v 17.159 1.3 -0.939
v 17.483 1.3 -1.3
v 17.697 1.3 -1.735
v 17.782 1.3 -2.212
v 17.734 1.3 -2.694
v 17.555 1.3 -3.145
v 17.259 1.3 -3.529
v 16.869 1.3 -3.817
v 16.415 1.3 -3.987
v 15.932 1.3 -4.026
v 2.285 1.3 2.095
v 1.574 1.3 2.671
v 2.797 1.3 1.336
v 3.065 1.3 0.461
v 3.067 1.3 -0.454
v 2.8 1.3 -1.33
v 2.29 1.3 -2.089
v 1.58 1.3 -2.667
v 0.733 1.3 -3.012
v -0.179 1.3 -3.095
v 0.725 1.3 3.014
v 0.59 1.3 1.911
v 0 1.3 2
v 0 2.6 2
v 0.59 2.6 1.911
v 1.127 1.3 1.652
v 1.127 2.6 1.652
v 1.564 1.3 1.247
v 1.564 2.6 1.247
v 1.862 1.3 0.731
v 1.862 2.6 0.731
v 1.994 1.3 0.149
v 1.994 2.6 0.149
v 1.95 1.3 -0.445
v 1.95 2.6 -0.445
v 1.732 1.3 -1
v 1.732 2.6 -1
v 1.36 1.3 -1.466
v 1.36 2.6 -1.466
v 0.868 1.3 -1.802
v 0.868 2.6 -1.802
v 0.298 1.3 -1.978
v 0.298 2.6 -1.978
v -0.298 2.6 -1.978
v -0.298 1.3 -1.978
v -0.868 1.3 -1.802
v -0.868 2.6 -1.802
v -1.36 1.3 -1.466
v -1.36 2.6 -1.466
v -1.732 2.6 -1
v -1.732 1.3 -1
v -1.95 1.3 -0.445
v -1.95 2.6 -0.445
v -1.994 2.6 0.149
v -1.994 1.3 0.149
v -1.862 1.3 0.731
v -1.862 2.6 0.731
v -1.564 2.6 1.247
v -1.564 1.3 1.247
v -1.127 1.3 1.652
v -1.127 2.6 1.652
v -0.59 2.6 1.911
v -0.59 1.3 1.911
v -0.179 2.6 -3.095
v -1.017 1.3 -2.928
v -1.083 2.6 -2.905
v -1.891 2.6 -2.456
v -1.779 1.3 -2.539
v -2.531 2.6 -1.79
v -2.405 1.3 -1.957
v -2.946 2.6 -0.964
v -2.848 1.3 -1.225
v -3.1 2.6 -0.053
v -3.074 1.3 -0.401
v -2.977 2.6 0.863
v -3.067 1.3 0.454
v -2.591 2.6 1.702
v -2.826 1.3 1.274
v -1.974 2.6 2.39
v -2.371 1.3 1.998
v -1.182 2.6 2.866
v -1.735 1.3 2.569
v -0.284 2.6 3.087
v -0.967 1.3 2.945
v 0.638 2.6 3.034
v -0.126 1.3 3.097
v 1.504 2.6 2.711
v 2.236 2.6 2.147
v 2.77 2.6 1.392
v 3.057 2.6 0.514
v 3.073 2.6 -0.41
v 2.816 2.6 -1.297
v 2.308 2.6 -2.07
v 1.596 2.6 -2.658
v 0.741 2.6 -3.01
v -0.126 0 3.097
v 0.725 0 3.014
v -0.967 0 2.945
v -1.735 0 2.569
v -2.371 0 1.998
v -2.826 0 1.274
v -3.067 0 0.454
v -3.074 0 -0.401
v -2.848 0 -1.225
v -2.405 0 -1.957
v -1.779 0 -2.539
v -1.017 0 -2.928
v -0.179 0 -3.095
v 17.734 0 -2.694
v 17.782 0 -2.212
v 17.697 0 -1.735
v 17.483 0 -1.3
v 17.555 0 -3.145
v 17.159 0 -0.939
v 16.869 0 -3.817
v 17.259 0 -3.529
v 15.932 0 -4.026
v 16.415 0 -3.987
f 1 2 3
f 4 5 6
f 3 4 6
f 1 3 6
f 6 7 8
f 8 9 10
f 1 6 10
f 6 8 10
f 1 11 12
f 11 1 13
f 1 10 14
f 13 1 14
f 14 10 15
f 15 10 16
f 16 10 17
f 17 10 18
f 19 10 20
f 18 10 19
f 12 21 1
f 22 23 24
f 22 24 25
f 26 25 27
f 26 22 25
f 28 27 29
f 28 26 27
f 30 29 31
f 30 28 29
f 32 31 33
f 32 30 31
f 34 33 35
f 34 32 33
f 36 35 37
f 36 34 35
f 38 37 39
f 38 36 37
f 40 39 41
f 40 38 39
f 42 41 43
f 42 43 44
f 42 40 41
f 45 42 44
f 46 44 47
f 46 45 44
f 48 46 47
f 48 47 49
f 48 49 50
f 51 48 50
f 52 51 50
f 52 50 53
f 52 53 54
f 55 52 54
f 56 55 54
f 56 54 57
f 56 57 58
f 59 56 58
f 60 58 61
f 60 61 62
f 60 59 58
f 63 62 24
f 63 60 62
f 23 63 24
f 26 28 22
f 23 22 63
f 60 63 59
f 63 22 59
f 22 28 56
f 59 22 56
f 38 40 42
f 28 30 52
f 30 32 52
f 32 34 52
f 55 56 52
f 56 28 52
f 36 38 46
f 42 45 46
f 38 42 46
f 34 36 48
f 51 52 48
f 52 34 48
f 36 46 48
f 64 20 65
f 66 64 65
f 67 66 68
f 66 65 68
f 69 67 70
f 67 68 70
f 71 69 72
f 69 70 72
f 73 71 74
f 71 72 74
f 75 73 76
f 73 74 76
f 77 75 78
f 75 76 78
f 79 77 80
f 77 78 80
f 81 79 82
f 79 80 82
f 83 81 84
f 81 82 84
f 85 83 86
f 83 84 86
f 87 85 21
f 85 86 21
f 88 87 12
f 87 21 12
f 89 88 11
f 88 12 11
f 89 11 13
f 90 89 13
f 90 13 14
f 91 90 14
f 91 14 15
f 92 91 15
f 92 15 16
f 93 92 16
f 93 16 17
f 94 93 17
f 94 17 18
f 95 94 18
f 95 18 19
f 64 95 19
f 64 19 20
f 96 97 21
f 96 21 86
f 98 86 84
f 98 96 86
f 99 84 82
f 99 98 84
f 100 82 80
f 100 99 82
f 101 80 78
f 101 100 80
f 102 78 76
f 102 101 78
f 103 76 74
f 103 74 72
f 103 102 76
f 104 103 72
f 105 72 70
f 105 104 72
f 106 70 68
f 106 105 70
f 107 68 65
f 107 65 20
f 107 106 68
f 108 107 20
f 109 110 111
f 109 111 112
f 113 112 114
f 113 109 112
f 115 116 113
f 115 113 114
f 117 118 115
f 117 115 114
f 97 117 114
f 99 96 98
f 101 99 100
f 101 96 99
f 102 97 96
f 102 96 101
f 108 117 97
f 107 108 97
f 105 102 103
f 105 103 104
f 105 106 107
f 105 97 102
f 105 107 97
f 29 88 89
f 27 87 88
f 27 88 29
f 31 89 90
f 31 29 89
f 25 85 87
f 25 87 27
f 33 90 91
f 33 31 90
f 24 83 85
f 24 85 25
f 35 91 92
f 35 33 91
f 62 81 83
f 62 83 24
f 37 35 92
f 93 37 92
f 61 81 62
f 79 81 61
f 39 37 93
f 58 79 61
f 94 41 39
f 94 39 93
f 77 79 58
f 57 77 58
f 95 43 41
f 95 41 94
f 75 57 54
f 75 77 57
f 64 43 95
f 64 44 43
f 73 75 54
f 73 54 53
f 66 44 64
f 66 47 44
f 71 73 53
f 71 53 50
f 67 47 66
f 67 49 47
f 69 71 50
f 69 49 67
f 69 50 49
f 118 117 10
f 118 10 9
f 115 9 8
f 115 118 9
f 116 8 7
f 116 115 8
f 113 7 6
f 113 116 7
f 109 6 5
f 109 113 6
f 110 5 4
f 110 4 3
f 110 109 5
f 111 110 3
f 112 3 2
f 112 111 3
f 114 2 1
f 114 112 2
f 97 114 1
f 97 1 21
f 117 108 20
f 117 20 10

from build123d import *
from build123d.topology import SkipClean

# Parameters (mm, degrees)
BOSS_EXTRUDE1_DEPTH = 1.3
SKETCH2_R           = 3.1
SKETCH2_R_2         = 2
BOSS_EXTRUDE2_DEPTH = 1.3


with BuildPart() as part:
    # Sketch1 → Boss-Extrude1 (new body)
    with BuildSketch(Plane(origin=(0, 0, 0), x_dir=(1, 0, 0), z_dir=(0, 1, 0))):
        with BuildLine():
            Line((-0.178960564, 3.094830063), (15.932363725, 4.026477881))
            ThreePointArc((15.932363725, 4.026477881), (17.659689309, 2.925654907), (17.159069655, 0.939491555))
            Line((17.159069655, 0.939491555), (0.725076499, -3.014011292))
            ThreePointArc((0.725076499, -3.014011292), (-3.066601756, -0.453821189), (-0.178960564, 3.094830063))
        make_face()
    extrude(amount=BOSS_EXTRUDE1_DEPTH)

    # Sketch2 → Boss-Extrude2 (add)
    with SkipClean():  # the faces are left unmerged after this step: merging them gives an invalid solid
        with BuildSketch(Plane(origin=(0, 1.3, 0), x_dir=(1, 0, 0), z_dir=(0, 1, 0))):
            with Locations(Location((0, 0, 0), (0, 0, 93.309480289))):
                Circle(SKETCH2_R)
            with Locations(Location((0, 0, 0), (0, 0, 270))):
                Circle(SKETCH2_R_2, mode=Mode.SUBTRACT)
        extrude(amount=BOSS_EXTRUDE2_DEPTH)


solid = part.part
